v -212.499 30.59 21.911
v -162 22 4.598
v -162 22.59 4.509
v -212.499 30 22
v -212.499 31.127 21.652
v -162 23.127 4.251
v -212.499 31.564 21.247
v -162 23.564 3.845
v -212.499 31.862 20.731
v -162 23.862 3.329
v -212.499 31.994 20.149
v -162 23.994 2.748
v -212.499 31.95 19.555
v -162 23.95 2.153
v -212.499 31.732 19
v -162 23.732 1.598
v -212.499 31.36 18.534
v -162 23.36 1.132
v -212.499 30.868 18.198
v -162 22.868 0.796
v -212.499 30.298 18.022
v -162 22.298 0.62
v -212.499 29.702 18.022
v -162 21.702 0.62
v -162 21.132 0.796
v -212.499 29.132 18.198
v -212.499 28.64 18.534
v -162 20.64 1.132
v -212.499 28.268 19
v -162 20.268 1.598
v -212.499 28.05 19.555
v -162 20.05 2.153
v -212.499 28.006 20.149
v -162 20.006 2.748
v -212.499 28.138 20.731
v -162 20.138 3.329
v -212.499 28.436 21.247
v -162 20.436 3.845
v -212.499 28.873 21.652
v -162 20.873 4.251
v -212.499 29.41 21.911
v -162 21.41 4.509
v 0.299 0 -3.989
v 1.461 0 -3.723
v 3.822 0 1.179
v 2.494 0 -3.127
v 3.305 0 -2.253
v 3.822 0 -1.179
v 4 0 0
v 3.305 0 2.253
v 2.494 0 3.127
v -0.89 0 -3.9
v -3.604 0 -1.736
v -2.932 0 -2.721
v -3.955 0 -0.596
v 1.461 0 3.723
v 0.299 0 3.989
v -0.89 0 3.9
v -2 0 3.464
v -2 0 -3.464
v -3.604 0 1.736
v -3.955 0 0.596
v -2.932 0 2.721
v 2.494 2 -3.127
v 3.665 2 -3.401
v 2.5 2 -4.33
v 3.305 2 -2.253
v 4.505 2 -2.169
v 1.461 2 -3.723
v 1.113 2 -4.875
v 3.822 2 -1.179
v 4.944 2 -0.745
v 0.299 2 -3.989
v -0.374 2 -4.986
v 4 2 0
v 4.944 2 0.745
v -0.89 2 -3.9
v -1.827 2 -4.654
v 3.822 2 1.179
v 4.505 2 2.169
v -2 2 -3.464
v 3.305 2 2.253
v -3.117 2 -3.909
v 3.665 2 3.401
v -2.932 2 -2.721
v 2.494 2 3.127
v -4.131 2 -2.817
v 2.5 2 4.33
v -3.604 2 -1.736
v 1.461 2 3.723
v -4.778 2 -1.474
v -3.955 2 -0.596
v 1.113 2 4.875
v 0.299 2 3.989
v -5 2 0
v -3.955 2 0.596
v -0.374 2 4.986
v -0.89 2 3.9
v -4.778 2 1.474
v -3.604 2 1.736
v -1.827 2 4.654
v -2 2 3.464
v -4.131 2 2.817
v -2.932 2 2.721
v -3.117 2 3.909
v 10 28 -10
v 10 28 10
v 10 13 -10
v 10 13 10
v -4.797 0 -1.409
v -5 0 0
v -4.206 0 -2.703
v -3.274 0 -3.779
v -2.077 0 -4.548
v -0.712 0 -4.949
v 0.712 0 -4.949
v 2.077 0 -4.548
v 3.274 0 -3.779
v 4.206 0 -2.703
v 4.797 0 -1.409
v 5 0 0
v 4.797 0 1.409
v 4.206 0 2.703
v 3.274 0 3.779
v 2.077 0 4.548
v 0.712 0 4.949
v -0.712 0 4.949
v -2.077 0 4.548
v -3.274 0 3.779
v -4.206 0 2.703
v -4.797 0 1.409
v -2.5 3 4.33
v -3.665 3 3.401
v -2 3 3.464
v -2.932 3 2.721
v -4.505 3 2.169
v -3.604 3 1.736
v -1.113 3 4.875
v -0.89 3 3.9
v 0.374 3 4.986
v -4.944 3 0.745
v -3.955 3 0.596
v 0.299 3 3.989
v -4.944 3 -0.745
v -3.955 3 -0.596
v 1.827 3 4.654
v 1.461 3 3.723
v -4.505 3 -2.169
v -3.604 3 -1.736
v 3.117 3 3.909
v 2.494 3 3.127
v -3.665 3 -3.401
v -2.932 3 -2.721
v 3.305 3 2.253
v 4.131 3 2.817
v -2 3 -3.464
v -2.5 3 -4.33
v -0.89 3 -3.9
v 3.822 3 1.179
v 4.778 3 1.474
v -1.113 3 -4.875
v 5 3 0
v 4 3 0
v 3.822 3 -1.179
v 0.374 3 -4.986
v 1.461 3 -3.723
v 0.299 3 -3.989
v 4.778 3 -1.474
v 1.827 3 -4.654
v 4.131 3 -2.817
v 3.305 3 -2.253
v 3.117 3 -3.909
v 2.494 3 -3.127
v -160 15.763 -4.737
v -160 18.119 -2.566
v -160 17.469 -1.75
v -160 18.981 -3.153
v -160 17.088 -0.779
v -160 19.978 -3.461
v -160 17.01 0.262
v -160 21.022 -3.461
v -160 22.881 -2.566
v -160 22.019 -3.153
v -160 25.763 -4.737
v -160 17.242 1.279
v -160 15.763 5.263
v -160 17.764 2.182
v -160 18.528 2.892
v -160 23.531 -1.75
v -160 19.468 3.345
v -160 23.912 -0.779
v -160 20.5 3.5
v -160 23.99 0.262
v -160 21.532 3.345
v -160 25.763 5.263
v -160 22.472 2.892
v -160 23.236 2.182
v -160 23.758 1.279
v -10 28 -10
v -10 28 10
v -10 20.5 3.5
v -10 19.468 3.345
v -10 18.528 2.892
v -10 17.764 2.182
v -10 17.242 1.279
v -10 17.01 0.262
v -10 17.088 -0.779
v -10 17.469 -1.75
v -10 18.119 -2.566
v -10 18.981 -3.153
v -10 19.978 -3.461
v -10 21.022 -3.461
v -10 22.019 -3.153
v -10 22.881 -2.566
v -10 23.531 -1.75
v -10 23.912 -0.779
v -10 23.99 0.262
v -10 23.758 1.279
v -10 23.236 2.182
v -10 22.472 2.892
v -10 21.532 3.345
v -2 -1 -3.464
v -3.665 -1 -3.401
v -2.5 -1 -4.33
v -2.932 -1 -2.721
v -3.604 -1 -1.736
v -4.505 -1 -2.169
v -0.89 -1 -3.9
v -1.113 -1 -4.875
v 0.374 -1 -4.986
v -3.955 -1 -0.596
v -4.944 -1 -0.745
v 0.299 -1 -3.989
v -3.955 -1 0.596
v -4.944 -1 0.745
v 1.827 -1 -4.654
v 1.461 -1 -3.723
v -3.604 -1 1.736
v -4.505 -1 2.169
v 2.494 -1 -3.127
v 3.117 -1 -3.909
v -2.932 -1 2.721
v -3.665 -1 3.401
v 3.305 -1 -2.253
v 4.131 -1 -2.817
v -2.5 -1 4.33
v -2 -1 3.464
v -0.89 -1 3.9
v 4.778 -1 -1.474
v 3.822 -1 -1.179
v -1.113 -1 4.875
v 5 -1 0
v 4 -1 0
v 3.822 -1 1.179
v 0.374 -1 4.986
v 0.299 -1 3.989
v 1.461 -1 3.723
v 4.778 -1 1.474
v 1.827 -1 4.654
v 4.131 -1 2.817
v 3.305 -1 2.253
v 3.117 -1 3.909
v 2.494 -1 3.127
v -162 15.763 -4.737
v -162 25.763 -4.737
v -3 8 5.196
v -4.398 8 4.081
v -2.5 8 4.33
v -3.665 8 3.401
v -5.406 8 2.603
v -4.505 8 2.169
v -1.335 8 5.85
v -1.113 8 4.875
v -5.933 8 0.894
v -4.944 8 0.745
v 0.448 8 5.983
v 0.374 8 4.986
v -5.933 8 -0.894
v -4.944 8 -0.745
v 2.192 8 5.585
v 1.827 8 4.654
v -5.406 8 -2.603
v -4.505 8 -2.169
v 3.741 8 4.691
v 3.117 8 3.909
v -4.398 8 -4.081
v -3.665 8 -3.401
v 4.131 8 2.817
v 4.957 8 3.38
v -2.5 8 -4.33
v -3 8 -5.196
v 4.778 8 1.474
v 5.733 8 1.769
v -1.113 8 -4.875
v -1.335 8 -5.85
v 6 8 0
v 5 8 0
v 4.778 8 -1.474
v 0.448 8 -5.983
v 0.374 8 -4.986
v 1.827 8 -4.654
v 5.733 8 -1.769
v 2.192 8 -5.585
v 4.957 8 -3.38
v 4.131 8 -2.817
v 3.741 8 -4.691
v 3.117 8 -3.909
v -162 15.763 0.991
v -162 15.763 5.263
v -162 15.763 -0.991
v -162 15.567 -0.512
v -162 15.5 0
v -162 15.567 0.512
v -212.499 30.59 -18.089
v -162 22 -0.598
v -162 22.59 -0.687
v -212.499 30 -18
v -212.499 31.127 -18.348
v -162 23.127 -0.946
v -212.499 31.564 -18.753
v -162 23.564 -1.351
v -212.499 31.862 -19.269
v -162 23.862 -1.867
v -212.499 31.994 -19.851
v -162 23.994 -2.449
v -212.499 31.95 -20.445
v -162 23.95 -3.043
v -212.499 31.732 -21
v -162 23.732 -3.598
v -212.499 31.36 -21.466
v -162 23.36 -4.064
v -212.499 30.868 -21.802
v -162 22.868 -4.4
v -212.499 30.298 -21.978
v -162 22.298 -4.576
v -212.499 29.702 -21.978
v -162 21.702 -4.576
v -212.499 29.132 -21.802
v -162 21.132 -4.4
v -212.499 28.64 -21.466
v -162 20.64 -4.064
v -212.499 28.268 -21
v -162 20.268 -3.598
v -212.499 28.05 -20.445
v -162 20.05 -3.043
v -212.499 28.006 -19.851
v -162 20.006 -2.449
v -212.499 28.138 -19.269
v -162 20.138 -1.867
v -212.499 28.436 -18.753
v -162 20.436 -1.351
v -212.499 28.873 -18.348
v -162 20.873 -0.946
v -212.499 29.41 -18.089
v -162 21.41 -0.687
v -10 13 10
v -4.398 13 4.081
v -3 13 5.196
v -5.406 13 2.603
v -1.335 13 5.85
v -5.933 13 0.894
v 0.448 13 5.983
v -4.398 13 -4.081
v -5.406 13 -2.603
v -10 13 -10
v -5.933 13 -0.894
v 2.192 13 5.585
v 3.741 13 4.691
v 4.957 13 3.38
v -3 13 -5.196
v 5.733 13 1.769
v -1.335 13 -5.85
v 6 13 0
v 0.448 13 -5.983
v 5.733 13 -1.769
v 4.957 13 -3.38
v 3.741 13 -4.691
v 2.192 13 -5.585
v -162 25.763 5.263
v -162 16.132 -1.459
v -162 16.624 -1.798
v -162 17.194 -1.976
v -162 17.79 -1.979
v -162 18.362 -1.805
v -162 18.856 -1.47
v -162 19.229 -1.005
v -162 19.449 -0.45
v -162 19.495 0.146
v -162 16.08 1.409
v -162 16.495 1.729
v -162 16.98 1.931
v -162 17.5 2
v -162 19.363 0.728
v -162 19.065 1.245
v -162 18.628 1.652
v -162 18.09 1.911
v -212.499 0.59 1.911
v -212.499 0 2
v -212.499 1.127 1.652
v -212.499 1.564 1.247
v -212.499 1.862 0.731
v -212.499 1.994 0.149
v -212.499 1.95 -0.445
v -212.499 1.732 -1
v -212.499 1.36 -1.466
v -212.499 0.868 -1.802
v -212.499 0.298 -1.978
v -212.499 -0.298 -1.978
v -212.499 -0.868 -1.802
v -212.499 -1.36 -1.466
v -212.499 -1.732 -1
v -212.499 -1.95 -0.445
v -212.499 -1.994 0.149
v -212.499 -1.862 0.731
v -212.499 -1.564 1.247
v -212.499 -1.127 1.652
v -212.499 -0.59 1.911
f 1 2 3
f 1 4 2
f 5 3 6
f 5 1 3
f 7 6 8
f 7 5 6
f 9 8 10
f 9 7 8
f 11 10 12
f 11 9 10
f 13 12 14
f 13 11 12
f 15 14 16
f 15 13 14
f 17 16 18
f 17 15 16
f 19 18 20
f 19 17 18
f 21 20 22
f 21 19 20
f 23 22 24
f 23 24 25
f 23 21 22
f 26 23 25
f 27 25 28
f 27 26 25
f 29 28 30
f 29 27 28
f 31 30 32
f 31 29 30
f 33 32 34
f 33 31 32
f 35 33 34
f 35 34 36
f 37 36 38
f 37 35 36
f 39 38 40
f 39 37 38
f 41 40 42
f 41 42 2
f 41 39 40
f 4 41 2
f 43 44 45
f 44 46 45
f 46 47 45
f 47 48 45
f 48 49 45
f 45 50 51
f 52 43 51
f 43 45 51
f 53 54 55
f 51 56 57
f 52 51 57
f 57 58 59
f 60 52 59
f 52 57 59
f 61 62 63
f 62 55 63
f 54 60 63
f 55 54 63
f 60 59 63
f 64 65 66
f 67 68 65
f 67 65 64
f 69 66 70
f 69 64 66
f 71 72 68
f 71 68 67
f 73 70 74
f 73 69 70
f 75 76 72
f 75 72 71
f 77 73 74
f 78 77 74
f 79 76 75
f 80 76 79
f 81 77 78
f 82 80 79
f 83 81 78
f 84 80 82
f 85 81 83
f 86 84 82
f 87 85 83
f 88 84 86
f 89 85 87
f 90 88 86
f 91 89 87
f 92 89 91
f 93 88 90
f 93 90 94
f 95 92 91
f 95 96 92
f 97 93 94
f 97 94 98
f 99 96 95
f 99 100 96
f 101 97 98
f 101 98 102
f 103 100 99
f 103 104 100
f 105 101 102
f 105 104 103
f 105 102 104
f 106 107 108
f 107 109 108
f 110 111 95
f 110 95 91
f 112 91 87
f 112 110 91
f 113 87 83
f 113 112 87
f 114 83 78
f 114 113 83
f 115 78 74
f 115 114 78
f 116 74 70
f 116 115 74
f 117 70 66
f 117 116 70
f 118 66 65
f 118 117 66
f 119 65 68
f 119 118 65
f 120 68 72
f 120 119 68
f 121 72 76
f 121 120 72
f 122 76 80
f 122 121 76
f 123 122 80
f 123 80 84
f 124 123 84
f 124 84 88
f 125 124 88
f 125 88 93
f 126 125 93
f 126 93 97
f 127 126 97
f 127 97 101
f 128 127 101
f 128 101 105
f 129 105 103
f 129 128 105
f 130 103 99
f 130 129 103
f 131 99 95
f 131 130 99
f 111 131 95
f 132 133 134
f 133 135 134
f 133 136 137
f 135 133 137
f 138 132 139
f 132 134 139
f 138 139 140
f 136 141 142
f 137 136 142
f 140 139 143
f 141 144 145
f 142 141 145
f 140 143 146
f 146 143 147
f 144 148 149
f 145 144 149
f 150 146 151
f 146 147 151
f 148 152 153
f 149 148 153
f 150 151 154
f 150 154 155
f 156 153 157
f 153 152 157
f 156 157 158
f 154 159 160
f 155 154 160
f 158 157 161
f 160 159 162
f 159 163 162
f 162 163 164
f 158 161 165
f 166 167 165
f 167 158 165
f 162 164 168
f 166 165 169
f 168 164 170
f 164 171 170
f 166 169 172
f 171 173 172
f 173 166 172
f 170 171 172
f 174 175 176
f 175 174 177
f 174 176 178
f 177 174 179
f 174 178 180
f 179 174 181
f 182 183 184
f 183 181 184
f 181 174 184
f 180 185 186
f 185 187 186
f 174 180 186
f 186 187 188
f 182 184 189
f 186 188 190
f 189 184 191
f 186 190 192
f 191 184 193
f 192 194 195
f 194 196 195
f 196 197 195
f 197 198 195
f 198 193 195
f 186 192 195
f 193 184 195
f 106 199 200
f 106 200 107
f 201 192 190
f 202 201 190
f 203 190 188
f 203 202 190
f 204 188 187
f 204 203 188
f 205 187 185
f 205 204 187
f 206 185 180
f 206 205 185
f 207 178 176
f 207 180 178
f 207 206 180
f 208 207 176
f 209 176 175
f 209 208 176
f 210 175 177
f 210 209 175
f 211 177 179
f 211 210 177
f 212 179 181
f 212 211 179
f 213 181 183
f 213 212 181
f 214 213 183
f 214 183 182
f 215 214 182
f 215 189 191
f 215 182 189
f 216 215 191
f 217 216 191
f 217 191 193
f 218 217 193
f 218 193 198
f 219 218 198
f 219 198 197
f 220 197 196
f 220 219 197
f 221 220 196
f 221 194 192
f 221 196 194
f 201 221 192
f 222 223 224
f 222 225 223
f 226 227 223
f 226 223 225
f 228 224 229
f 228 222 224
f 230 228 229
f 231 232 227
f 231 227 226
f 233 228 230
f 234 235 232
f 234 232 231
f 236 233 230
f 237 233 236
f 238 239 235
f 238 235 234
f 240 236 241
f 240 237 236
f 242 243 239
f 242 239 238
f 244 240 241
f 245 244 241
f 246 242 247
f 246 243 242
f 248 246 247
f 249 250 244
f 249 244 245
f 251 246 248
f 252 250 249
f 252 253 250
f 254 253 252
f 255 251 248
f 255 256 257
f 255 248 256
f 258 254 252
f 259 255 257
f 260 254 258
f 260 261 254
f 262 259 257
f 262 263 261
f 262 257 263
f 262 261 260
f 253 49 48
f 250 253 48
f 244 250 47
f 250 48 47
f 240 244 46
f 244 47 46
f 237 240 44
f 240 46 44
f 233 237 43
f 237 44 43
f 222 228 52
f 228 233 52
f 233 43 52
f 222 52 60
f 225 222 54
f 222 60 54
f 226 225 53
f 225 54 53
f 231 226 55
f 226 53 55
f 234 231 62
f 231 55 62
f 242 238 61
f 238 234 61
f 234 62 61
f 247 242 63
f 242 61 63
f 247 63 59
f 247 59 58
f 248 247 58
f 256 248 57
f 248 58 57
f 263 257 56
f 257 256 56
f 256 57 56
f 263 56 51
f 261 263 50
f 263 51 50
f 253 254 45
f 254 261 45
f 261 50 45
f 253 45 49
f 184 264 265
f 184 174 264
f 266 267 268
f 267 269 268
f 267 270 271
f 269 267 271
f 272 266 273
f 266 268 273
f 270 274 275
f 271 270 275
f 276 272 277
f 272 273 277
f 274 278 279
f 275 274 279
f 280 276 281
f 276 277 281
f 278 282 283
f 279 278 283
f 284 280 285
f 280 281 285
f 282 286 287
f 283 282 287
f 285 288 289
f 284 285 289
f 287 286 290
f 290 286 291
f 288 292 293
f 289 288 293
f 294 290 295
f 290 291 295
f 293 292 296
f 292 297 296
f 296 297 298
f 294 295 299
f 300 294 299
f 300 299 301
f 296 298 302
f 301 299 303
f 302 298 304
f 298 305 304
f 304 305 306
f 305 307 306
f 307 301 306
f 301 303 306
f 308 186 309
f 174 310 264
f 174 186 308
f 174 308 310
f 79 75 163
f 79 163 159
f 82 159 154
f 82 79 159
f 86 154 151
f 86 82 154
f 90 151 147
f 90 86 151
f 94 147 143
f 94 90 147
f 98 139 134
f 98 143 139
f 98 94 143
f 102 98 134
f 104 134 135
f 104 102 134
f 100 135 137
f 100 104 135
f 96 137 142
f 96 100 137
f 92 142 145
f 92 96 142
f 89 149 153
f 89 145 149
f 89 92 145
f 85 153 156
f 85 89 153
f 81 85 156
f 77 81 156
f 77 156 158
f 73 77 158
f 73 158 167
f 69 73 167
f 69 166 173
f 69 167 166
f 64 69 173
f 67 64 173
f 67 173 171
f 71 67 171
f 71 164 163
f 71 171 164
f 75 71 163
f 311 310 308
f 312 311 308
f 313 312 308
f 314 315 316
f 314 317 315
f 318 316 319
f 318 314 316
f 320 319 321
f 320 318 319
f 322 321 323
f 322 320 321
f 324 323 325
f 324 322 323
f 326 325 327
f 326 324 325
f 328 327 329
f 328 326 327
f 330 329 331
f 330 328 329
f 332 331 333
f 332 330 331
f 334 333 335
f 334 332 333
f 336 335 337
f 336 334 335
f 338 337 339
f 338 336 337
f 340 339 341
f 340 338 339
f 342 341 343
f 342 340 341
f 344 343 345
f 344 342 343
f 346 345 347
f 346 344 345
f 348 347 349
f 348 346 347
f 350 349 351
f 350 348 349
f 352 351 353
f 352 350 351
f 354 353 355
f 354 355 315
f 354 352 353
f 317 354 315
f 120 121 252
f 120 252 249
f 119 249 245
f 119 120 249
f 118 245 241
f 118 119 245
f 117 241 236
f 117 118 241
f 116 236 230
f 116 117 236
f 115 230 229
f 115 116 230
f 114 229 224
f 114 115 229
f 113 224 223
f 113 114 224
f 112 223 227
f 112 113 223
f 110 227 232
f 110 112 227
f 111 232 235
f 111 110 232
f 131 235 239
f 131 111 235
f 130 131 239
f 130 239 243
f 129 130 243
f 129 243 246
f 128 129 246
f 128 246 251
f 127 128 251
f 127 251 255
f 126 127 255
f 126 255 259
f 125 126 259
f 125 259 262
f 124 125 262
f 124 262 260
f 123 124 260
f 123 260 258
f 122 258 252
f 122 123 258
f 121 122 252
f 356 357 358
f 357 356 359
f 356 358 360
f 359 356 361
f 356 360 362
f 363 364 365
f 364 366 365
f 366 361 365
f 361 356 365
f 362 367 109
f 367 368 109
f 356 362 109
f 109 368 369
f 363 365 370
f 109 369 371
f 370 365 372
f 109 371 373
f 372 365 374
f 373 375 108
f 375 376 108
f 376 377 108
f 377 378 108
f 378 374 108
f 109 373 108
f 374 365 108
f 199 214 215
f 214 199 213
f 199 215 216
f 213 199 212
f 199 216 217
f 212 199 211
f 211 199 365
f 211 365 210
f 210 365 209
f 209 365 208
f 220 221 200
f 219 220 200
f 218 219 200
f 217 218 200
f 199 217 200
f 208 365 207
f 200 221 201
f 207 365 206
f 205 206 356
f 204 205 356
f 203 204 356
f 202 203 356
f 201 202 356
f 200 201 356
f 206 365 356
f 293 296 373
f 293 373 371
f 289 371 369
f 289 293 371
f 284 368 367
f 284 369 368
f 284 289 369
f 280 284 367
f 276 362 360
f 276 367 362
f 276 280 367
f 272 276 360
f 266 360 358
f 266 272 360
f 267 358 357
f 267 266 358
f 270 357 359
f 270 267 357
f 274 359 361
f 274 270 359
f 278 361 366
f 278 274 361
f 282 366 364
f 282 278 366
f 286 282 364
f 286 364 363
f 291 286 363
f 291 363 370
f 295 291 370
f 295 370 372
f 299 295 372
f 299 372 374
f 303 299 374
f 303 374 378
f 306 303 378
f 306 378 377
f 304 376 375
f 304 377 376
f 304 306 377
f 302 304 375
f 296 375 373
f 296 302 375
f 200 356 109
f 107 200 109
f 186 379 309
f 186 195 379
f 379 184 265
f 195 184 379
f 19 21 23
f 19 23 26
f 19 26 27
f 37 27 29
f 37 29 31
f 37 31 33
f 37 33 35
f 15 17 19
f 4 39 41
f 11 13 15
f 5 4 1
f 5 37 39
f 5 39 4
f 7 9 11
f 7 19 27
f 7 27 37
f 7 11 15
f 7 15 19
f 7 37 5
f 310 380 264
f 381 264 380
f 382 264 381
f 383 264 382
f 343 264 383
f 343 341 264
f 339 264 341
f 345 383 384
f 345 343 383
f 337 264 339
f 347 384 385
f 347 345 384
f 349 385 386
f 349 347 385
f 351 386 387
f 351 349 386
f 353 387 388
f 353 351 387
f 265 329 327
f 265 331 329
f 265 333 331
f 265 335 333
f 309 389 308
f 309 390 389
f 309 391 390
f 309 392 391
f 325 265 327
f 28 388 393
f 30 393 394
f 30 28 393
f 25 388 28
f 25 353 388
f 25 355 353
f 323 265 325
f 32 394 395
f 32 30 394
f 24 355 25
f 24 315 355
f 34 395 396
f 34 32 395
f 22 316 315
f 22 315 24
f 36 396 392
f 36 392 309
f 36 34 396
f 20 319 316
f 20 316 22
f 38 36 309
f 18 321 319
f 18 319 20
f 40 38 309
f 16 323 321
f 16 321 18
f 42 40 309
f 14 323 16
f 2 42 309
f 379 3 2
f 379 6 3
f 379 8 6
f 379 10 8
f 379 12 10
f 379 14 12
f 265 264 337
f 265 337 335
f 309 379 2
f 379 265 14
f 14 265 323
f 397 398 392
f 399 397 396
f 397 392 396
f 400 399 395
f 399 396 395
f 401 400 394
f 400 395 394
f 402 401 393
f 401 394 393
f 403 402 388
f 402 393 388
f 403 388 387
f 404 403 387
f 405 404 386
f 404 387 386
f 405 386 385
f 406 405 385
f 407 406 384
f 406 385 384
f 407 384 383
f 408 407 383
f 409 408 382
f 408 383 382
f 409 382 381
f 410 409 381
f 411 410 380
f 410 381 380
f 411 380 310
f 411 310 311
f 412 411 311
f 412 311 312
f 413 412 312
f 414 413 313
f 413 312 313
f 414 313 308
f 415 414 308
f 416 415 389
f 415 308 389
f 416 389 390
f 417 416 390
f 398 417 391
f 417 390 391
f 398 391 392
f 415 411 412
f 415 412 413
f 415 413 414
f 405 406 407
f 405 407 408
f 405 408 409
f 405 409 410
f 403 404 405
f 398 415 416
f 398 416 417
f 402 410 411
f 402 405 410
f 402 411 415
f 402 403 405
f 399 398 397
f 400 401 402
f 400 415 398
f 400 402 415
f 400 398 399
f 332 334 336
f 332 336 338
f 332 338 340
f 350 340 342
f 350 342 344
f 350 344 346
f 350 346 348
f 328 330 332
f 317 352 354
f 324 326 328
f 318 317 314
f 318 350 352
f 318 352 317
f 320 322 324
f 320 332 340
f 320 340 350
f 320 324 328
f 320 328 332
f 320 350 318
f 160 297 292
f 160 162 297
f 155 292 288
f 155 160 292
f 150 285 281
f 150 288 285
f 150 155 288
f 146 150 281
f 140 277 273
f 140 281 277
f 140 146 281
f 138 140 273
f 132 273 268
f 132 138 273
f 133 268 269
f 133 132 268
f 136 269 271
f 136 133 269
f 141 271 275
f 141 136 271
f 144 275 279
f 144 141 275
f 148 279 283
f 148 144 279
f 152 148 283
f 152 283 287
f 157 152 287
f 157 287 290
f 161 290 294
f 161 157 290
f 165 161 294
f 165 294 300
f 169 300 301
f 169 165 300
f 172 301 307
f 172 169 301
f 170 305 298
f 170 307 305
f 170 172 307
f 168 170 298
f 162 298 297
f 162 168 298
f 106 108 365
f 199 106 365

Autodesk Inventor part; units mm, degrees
ref_plane "YZ Plane" through (0, 0, 0) normal (1, 0, 0) x (0, 1, 0)
ref_plane "XZ Plane" through (0, 0, 0) normal (0, 1, 0) x (-1, 0, 0)
sketch "草图1" plane through (0, 0, 0) normal (0, 1, 0) x (-1, 0, 0)
  circle A0 centre (0, 0) radius 5
  dimension "d0" = 10
extrude "拉伸1" add sketch "草图1" along normal blind 2
sketch "草图2" plane through (0, 2, 0) normal (0, 1, 0) x (1, 0, 0)
  circle A0 centre (0, 0) radius 5 projected
  circle A1 centre (0, 0) radius 4
  dimension "d3" = 8
extrude "拉伸2" add sketch "草图2" along normal blind 1 contours A1
sketch "草图3" plane through (0, 3, 0) normal (0, 1, 0) x (1, 0, 0)
  circle A0 centre (0, 0) radius 5 projected
extrude "拉伸3" add sketch "草图3" along normal blind 5
sketch "草图4" plane through (0, 0, 0) normal (0, -1, 0) x (1, 0, 0)
  circle A0 centre (0, 0) radius 5 projected
  circle A1 centre (0, 0) radius 4 projected
extrude "拉伸4" add sketch "草图4" along normal blind 1
sketch "草图5" plane through (0, 8, 0) normal (0, 1, 0) x (1, 0, 0)
  circle A0 centre (0, 0) radius 6
  dimension "d10" = 12
extrude "拉伸5" add sketch "草图5" along normal blind 5
sketch "草图6" plane through (0, 13, 0) normal (0, 1, 0) x (1, 0, 0)
  line L0 (-10, -10) -> (10, -10)
  line L1 (10, -10) -> (10, 10)
  line L2 (10, 10) -> (-10, 10)
  line L3 (-10, 10) -> (-10, -10)
  line L4 (-10, -10) -> (10, 10) construction
  line L5 (10, -10) -> (-10, 10) construction
  point P0 (0, 0)
  dimension "d13" = 20
extrude "拉伸6" add sketch "草图6" along normal blind 15
sketch "草图7" plane through (-10, 13, -10) normal (-1, 0, 0) x (0, 0, 1)
  line L0 (20, 0) -> (20, 15) construction
  line L1 (20, 0) -> (0, 0) construction
  line L2 (20, 15) -> (0, 0) construction
  line L3 (20, 0) -> (0, 15) construction
  circle A0 centre (10, 7.5) radius 3.5
  point P0 (10, -13)
  dimension "d16" = 7
extrude "拉伸7" add sketch "草图7" along normal blind 150
sketch "草图8" plane through (-160, 20.5, 0) normal (-1, 0, 0) x (0, 0, 1)
  line L0 (-4.7374, 5.2626) -> (5.2626, 5.2626)
  line L1 (5.2626, 5.2626) -> (5.2626, -4.7374)
  line L2 (5.2626, -4.7374) -> (-4.7374, -4.7374)
  line L3 (-4.7374, -4.7374) -> (-4.7374, 5.2626)
  line L4 (-4.7374, 5.2626) -> (5.2626, -4.7374) construction
  line L5 (5.2626, 5.2626) -> (-4.7374, -4.7374) construction
  point P0 (0, -20.5)
  point P1 (0.2626, 0.2626)
  dimension "d19" = 10
extrude "拉伸8" add sketch "草图8" along normal blind 2
sketch "草图9" plane through (-162, 20.5, 0) normal (-1, 0, 0) x (0, 0, 1)
  line L0 (0, 0) -> (0, 3) construction
  line L1 (0, 0) -> (-2.5981, -1.5) construction
  line L2 (0, 0) -> (2.5981, -1.5) construction
  line L3 (0, 0) -> (-4.7226, 0) construction
  circle A0 centre (-2.5981, 1.5) radius 2
  circle A1 centre (0, -3) radius 2
  circle A2 centre (2.5981, 1.5) radius 2
  point P0 (0, -20.5)
  dimension "d22" = 120
  dimension "d23" = 120
  dimension "d24" = 3
  dimension "d26" = 3
  dimension "d27" = 3
ref_plane "工作平面2" through (-212.499, 20.5, 0) normal (-1, 0, 0) x (0, 0, 1)
ref_plane "工作平面1" through (-161, 20.5, 0) normal (-1, 0, 0) x (0, 0, 1)
sketch "草图10" plane through (-212.499, 20.5, 0) normal (-1, 0, 0) x (0, 0, 1)
  line L0 (0, 18.3) -> (0, -29.3) construction
  line L1 (-30.8, -20.5) -> (30.8, -20.5) construction
  circle A0 centre (0, -20.5) radius 2
  circle A1 centre (-20, 9.5) radius 2
  circle A2 centre (20, 9.5) radius 2
  dimension "d32" = 4
  dimension "d33" = 4
  dimension "d34" = 30
  dimension "d35" = 20
loft "放样1" add profiles "草图10", "草图9" contours A0 / A1
loft "放样2" add profiles "草图9", "草图10" contours A2 / A2
loft "放样3" add profiles "草图9", "草图10" contours A0 / A1
properties part number "摄像头" material "橡胶"
